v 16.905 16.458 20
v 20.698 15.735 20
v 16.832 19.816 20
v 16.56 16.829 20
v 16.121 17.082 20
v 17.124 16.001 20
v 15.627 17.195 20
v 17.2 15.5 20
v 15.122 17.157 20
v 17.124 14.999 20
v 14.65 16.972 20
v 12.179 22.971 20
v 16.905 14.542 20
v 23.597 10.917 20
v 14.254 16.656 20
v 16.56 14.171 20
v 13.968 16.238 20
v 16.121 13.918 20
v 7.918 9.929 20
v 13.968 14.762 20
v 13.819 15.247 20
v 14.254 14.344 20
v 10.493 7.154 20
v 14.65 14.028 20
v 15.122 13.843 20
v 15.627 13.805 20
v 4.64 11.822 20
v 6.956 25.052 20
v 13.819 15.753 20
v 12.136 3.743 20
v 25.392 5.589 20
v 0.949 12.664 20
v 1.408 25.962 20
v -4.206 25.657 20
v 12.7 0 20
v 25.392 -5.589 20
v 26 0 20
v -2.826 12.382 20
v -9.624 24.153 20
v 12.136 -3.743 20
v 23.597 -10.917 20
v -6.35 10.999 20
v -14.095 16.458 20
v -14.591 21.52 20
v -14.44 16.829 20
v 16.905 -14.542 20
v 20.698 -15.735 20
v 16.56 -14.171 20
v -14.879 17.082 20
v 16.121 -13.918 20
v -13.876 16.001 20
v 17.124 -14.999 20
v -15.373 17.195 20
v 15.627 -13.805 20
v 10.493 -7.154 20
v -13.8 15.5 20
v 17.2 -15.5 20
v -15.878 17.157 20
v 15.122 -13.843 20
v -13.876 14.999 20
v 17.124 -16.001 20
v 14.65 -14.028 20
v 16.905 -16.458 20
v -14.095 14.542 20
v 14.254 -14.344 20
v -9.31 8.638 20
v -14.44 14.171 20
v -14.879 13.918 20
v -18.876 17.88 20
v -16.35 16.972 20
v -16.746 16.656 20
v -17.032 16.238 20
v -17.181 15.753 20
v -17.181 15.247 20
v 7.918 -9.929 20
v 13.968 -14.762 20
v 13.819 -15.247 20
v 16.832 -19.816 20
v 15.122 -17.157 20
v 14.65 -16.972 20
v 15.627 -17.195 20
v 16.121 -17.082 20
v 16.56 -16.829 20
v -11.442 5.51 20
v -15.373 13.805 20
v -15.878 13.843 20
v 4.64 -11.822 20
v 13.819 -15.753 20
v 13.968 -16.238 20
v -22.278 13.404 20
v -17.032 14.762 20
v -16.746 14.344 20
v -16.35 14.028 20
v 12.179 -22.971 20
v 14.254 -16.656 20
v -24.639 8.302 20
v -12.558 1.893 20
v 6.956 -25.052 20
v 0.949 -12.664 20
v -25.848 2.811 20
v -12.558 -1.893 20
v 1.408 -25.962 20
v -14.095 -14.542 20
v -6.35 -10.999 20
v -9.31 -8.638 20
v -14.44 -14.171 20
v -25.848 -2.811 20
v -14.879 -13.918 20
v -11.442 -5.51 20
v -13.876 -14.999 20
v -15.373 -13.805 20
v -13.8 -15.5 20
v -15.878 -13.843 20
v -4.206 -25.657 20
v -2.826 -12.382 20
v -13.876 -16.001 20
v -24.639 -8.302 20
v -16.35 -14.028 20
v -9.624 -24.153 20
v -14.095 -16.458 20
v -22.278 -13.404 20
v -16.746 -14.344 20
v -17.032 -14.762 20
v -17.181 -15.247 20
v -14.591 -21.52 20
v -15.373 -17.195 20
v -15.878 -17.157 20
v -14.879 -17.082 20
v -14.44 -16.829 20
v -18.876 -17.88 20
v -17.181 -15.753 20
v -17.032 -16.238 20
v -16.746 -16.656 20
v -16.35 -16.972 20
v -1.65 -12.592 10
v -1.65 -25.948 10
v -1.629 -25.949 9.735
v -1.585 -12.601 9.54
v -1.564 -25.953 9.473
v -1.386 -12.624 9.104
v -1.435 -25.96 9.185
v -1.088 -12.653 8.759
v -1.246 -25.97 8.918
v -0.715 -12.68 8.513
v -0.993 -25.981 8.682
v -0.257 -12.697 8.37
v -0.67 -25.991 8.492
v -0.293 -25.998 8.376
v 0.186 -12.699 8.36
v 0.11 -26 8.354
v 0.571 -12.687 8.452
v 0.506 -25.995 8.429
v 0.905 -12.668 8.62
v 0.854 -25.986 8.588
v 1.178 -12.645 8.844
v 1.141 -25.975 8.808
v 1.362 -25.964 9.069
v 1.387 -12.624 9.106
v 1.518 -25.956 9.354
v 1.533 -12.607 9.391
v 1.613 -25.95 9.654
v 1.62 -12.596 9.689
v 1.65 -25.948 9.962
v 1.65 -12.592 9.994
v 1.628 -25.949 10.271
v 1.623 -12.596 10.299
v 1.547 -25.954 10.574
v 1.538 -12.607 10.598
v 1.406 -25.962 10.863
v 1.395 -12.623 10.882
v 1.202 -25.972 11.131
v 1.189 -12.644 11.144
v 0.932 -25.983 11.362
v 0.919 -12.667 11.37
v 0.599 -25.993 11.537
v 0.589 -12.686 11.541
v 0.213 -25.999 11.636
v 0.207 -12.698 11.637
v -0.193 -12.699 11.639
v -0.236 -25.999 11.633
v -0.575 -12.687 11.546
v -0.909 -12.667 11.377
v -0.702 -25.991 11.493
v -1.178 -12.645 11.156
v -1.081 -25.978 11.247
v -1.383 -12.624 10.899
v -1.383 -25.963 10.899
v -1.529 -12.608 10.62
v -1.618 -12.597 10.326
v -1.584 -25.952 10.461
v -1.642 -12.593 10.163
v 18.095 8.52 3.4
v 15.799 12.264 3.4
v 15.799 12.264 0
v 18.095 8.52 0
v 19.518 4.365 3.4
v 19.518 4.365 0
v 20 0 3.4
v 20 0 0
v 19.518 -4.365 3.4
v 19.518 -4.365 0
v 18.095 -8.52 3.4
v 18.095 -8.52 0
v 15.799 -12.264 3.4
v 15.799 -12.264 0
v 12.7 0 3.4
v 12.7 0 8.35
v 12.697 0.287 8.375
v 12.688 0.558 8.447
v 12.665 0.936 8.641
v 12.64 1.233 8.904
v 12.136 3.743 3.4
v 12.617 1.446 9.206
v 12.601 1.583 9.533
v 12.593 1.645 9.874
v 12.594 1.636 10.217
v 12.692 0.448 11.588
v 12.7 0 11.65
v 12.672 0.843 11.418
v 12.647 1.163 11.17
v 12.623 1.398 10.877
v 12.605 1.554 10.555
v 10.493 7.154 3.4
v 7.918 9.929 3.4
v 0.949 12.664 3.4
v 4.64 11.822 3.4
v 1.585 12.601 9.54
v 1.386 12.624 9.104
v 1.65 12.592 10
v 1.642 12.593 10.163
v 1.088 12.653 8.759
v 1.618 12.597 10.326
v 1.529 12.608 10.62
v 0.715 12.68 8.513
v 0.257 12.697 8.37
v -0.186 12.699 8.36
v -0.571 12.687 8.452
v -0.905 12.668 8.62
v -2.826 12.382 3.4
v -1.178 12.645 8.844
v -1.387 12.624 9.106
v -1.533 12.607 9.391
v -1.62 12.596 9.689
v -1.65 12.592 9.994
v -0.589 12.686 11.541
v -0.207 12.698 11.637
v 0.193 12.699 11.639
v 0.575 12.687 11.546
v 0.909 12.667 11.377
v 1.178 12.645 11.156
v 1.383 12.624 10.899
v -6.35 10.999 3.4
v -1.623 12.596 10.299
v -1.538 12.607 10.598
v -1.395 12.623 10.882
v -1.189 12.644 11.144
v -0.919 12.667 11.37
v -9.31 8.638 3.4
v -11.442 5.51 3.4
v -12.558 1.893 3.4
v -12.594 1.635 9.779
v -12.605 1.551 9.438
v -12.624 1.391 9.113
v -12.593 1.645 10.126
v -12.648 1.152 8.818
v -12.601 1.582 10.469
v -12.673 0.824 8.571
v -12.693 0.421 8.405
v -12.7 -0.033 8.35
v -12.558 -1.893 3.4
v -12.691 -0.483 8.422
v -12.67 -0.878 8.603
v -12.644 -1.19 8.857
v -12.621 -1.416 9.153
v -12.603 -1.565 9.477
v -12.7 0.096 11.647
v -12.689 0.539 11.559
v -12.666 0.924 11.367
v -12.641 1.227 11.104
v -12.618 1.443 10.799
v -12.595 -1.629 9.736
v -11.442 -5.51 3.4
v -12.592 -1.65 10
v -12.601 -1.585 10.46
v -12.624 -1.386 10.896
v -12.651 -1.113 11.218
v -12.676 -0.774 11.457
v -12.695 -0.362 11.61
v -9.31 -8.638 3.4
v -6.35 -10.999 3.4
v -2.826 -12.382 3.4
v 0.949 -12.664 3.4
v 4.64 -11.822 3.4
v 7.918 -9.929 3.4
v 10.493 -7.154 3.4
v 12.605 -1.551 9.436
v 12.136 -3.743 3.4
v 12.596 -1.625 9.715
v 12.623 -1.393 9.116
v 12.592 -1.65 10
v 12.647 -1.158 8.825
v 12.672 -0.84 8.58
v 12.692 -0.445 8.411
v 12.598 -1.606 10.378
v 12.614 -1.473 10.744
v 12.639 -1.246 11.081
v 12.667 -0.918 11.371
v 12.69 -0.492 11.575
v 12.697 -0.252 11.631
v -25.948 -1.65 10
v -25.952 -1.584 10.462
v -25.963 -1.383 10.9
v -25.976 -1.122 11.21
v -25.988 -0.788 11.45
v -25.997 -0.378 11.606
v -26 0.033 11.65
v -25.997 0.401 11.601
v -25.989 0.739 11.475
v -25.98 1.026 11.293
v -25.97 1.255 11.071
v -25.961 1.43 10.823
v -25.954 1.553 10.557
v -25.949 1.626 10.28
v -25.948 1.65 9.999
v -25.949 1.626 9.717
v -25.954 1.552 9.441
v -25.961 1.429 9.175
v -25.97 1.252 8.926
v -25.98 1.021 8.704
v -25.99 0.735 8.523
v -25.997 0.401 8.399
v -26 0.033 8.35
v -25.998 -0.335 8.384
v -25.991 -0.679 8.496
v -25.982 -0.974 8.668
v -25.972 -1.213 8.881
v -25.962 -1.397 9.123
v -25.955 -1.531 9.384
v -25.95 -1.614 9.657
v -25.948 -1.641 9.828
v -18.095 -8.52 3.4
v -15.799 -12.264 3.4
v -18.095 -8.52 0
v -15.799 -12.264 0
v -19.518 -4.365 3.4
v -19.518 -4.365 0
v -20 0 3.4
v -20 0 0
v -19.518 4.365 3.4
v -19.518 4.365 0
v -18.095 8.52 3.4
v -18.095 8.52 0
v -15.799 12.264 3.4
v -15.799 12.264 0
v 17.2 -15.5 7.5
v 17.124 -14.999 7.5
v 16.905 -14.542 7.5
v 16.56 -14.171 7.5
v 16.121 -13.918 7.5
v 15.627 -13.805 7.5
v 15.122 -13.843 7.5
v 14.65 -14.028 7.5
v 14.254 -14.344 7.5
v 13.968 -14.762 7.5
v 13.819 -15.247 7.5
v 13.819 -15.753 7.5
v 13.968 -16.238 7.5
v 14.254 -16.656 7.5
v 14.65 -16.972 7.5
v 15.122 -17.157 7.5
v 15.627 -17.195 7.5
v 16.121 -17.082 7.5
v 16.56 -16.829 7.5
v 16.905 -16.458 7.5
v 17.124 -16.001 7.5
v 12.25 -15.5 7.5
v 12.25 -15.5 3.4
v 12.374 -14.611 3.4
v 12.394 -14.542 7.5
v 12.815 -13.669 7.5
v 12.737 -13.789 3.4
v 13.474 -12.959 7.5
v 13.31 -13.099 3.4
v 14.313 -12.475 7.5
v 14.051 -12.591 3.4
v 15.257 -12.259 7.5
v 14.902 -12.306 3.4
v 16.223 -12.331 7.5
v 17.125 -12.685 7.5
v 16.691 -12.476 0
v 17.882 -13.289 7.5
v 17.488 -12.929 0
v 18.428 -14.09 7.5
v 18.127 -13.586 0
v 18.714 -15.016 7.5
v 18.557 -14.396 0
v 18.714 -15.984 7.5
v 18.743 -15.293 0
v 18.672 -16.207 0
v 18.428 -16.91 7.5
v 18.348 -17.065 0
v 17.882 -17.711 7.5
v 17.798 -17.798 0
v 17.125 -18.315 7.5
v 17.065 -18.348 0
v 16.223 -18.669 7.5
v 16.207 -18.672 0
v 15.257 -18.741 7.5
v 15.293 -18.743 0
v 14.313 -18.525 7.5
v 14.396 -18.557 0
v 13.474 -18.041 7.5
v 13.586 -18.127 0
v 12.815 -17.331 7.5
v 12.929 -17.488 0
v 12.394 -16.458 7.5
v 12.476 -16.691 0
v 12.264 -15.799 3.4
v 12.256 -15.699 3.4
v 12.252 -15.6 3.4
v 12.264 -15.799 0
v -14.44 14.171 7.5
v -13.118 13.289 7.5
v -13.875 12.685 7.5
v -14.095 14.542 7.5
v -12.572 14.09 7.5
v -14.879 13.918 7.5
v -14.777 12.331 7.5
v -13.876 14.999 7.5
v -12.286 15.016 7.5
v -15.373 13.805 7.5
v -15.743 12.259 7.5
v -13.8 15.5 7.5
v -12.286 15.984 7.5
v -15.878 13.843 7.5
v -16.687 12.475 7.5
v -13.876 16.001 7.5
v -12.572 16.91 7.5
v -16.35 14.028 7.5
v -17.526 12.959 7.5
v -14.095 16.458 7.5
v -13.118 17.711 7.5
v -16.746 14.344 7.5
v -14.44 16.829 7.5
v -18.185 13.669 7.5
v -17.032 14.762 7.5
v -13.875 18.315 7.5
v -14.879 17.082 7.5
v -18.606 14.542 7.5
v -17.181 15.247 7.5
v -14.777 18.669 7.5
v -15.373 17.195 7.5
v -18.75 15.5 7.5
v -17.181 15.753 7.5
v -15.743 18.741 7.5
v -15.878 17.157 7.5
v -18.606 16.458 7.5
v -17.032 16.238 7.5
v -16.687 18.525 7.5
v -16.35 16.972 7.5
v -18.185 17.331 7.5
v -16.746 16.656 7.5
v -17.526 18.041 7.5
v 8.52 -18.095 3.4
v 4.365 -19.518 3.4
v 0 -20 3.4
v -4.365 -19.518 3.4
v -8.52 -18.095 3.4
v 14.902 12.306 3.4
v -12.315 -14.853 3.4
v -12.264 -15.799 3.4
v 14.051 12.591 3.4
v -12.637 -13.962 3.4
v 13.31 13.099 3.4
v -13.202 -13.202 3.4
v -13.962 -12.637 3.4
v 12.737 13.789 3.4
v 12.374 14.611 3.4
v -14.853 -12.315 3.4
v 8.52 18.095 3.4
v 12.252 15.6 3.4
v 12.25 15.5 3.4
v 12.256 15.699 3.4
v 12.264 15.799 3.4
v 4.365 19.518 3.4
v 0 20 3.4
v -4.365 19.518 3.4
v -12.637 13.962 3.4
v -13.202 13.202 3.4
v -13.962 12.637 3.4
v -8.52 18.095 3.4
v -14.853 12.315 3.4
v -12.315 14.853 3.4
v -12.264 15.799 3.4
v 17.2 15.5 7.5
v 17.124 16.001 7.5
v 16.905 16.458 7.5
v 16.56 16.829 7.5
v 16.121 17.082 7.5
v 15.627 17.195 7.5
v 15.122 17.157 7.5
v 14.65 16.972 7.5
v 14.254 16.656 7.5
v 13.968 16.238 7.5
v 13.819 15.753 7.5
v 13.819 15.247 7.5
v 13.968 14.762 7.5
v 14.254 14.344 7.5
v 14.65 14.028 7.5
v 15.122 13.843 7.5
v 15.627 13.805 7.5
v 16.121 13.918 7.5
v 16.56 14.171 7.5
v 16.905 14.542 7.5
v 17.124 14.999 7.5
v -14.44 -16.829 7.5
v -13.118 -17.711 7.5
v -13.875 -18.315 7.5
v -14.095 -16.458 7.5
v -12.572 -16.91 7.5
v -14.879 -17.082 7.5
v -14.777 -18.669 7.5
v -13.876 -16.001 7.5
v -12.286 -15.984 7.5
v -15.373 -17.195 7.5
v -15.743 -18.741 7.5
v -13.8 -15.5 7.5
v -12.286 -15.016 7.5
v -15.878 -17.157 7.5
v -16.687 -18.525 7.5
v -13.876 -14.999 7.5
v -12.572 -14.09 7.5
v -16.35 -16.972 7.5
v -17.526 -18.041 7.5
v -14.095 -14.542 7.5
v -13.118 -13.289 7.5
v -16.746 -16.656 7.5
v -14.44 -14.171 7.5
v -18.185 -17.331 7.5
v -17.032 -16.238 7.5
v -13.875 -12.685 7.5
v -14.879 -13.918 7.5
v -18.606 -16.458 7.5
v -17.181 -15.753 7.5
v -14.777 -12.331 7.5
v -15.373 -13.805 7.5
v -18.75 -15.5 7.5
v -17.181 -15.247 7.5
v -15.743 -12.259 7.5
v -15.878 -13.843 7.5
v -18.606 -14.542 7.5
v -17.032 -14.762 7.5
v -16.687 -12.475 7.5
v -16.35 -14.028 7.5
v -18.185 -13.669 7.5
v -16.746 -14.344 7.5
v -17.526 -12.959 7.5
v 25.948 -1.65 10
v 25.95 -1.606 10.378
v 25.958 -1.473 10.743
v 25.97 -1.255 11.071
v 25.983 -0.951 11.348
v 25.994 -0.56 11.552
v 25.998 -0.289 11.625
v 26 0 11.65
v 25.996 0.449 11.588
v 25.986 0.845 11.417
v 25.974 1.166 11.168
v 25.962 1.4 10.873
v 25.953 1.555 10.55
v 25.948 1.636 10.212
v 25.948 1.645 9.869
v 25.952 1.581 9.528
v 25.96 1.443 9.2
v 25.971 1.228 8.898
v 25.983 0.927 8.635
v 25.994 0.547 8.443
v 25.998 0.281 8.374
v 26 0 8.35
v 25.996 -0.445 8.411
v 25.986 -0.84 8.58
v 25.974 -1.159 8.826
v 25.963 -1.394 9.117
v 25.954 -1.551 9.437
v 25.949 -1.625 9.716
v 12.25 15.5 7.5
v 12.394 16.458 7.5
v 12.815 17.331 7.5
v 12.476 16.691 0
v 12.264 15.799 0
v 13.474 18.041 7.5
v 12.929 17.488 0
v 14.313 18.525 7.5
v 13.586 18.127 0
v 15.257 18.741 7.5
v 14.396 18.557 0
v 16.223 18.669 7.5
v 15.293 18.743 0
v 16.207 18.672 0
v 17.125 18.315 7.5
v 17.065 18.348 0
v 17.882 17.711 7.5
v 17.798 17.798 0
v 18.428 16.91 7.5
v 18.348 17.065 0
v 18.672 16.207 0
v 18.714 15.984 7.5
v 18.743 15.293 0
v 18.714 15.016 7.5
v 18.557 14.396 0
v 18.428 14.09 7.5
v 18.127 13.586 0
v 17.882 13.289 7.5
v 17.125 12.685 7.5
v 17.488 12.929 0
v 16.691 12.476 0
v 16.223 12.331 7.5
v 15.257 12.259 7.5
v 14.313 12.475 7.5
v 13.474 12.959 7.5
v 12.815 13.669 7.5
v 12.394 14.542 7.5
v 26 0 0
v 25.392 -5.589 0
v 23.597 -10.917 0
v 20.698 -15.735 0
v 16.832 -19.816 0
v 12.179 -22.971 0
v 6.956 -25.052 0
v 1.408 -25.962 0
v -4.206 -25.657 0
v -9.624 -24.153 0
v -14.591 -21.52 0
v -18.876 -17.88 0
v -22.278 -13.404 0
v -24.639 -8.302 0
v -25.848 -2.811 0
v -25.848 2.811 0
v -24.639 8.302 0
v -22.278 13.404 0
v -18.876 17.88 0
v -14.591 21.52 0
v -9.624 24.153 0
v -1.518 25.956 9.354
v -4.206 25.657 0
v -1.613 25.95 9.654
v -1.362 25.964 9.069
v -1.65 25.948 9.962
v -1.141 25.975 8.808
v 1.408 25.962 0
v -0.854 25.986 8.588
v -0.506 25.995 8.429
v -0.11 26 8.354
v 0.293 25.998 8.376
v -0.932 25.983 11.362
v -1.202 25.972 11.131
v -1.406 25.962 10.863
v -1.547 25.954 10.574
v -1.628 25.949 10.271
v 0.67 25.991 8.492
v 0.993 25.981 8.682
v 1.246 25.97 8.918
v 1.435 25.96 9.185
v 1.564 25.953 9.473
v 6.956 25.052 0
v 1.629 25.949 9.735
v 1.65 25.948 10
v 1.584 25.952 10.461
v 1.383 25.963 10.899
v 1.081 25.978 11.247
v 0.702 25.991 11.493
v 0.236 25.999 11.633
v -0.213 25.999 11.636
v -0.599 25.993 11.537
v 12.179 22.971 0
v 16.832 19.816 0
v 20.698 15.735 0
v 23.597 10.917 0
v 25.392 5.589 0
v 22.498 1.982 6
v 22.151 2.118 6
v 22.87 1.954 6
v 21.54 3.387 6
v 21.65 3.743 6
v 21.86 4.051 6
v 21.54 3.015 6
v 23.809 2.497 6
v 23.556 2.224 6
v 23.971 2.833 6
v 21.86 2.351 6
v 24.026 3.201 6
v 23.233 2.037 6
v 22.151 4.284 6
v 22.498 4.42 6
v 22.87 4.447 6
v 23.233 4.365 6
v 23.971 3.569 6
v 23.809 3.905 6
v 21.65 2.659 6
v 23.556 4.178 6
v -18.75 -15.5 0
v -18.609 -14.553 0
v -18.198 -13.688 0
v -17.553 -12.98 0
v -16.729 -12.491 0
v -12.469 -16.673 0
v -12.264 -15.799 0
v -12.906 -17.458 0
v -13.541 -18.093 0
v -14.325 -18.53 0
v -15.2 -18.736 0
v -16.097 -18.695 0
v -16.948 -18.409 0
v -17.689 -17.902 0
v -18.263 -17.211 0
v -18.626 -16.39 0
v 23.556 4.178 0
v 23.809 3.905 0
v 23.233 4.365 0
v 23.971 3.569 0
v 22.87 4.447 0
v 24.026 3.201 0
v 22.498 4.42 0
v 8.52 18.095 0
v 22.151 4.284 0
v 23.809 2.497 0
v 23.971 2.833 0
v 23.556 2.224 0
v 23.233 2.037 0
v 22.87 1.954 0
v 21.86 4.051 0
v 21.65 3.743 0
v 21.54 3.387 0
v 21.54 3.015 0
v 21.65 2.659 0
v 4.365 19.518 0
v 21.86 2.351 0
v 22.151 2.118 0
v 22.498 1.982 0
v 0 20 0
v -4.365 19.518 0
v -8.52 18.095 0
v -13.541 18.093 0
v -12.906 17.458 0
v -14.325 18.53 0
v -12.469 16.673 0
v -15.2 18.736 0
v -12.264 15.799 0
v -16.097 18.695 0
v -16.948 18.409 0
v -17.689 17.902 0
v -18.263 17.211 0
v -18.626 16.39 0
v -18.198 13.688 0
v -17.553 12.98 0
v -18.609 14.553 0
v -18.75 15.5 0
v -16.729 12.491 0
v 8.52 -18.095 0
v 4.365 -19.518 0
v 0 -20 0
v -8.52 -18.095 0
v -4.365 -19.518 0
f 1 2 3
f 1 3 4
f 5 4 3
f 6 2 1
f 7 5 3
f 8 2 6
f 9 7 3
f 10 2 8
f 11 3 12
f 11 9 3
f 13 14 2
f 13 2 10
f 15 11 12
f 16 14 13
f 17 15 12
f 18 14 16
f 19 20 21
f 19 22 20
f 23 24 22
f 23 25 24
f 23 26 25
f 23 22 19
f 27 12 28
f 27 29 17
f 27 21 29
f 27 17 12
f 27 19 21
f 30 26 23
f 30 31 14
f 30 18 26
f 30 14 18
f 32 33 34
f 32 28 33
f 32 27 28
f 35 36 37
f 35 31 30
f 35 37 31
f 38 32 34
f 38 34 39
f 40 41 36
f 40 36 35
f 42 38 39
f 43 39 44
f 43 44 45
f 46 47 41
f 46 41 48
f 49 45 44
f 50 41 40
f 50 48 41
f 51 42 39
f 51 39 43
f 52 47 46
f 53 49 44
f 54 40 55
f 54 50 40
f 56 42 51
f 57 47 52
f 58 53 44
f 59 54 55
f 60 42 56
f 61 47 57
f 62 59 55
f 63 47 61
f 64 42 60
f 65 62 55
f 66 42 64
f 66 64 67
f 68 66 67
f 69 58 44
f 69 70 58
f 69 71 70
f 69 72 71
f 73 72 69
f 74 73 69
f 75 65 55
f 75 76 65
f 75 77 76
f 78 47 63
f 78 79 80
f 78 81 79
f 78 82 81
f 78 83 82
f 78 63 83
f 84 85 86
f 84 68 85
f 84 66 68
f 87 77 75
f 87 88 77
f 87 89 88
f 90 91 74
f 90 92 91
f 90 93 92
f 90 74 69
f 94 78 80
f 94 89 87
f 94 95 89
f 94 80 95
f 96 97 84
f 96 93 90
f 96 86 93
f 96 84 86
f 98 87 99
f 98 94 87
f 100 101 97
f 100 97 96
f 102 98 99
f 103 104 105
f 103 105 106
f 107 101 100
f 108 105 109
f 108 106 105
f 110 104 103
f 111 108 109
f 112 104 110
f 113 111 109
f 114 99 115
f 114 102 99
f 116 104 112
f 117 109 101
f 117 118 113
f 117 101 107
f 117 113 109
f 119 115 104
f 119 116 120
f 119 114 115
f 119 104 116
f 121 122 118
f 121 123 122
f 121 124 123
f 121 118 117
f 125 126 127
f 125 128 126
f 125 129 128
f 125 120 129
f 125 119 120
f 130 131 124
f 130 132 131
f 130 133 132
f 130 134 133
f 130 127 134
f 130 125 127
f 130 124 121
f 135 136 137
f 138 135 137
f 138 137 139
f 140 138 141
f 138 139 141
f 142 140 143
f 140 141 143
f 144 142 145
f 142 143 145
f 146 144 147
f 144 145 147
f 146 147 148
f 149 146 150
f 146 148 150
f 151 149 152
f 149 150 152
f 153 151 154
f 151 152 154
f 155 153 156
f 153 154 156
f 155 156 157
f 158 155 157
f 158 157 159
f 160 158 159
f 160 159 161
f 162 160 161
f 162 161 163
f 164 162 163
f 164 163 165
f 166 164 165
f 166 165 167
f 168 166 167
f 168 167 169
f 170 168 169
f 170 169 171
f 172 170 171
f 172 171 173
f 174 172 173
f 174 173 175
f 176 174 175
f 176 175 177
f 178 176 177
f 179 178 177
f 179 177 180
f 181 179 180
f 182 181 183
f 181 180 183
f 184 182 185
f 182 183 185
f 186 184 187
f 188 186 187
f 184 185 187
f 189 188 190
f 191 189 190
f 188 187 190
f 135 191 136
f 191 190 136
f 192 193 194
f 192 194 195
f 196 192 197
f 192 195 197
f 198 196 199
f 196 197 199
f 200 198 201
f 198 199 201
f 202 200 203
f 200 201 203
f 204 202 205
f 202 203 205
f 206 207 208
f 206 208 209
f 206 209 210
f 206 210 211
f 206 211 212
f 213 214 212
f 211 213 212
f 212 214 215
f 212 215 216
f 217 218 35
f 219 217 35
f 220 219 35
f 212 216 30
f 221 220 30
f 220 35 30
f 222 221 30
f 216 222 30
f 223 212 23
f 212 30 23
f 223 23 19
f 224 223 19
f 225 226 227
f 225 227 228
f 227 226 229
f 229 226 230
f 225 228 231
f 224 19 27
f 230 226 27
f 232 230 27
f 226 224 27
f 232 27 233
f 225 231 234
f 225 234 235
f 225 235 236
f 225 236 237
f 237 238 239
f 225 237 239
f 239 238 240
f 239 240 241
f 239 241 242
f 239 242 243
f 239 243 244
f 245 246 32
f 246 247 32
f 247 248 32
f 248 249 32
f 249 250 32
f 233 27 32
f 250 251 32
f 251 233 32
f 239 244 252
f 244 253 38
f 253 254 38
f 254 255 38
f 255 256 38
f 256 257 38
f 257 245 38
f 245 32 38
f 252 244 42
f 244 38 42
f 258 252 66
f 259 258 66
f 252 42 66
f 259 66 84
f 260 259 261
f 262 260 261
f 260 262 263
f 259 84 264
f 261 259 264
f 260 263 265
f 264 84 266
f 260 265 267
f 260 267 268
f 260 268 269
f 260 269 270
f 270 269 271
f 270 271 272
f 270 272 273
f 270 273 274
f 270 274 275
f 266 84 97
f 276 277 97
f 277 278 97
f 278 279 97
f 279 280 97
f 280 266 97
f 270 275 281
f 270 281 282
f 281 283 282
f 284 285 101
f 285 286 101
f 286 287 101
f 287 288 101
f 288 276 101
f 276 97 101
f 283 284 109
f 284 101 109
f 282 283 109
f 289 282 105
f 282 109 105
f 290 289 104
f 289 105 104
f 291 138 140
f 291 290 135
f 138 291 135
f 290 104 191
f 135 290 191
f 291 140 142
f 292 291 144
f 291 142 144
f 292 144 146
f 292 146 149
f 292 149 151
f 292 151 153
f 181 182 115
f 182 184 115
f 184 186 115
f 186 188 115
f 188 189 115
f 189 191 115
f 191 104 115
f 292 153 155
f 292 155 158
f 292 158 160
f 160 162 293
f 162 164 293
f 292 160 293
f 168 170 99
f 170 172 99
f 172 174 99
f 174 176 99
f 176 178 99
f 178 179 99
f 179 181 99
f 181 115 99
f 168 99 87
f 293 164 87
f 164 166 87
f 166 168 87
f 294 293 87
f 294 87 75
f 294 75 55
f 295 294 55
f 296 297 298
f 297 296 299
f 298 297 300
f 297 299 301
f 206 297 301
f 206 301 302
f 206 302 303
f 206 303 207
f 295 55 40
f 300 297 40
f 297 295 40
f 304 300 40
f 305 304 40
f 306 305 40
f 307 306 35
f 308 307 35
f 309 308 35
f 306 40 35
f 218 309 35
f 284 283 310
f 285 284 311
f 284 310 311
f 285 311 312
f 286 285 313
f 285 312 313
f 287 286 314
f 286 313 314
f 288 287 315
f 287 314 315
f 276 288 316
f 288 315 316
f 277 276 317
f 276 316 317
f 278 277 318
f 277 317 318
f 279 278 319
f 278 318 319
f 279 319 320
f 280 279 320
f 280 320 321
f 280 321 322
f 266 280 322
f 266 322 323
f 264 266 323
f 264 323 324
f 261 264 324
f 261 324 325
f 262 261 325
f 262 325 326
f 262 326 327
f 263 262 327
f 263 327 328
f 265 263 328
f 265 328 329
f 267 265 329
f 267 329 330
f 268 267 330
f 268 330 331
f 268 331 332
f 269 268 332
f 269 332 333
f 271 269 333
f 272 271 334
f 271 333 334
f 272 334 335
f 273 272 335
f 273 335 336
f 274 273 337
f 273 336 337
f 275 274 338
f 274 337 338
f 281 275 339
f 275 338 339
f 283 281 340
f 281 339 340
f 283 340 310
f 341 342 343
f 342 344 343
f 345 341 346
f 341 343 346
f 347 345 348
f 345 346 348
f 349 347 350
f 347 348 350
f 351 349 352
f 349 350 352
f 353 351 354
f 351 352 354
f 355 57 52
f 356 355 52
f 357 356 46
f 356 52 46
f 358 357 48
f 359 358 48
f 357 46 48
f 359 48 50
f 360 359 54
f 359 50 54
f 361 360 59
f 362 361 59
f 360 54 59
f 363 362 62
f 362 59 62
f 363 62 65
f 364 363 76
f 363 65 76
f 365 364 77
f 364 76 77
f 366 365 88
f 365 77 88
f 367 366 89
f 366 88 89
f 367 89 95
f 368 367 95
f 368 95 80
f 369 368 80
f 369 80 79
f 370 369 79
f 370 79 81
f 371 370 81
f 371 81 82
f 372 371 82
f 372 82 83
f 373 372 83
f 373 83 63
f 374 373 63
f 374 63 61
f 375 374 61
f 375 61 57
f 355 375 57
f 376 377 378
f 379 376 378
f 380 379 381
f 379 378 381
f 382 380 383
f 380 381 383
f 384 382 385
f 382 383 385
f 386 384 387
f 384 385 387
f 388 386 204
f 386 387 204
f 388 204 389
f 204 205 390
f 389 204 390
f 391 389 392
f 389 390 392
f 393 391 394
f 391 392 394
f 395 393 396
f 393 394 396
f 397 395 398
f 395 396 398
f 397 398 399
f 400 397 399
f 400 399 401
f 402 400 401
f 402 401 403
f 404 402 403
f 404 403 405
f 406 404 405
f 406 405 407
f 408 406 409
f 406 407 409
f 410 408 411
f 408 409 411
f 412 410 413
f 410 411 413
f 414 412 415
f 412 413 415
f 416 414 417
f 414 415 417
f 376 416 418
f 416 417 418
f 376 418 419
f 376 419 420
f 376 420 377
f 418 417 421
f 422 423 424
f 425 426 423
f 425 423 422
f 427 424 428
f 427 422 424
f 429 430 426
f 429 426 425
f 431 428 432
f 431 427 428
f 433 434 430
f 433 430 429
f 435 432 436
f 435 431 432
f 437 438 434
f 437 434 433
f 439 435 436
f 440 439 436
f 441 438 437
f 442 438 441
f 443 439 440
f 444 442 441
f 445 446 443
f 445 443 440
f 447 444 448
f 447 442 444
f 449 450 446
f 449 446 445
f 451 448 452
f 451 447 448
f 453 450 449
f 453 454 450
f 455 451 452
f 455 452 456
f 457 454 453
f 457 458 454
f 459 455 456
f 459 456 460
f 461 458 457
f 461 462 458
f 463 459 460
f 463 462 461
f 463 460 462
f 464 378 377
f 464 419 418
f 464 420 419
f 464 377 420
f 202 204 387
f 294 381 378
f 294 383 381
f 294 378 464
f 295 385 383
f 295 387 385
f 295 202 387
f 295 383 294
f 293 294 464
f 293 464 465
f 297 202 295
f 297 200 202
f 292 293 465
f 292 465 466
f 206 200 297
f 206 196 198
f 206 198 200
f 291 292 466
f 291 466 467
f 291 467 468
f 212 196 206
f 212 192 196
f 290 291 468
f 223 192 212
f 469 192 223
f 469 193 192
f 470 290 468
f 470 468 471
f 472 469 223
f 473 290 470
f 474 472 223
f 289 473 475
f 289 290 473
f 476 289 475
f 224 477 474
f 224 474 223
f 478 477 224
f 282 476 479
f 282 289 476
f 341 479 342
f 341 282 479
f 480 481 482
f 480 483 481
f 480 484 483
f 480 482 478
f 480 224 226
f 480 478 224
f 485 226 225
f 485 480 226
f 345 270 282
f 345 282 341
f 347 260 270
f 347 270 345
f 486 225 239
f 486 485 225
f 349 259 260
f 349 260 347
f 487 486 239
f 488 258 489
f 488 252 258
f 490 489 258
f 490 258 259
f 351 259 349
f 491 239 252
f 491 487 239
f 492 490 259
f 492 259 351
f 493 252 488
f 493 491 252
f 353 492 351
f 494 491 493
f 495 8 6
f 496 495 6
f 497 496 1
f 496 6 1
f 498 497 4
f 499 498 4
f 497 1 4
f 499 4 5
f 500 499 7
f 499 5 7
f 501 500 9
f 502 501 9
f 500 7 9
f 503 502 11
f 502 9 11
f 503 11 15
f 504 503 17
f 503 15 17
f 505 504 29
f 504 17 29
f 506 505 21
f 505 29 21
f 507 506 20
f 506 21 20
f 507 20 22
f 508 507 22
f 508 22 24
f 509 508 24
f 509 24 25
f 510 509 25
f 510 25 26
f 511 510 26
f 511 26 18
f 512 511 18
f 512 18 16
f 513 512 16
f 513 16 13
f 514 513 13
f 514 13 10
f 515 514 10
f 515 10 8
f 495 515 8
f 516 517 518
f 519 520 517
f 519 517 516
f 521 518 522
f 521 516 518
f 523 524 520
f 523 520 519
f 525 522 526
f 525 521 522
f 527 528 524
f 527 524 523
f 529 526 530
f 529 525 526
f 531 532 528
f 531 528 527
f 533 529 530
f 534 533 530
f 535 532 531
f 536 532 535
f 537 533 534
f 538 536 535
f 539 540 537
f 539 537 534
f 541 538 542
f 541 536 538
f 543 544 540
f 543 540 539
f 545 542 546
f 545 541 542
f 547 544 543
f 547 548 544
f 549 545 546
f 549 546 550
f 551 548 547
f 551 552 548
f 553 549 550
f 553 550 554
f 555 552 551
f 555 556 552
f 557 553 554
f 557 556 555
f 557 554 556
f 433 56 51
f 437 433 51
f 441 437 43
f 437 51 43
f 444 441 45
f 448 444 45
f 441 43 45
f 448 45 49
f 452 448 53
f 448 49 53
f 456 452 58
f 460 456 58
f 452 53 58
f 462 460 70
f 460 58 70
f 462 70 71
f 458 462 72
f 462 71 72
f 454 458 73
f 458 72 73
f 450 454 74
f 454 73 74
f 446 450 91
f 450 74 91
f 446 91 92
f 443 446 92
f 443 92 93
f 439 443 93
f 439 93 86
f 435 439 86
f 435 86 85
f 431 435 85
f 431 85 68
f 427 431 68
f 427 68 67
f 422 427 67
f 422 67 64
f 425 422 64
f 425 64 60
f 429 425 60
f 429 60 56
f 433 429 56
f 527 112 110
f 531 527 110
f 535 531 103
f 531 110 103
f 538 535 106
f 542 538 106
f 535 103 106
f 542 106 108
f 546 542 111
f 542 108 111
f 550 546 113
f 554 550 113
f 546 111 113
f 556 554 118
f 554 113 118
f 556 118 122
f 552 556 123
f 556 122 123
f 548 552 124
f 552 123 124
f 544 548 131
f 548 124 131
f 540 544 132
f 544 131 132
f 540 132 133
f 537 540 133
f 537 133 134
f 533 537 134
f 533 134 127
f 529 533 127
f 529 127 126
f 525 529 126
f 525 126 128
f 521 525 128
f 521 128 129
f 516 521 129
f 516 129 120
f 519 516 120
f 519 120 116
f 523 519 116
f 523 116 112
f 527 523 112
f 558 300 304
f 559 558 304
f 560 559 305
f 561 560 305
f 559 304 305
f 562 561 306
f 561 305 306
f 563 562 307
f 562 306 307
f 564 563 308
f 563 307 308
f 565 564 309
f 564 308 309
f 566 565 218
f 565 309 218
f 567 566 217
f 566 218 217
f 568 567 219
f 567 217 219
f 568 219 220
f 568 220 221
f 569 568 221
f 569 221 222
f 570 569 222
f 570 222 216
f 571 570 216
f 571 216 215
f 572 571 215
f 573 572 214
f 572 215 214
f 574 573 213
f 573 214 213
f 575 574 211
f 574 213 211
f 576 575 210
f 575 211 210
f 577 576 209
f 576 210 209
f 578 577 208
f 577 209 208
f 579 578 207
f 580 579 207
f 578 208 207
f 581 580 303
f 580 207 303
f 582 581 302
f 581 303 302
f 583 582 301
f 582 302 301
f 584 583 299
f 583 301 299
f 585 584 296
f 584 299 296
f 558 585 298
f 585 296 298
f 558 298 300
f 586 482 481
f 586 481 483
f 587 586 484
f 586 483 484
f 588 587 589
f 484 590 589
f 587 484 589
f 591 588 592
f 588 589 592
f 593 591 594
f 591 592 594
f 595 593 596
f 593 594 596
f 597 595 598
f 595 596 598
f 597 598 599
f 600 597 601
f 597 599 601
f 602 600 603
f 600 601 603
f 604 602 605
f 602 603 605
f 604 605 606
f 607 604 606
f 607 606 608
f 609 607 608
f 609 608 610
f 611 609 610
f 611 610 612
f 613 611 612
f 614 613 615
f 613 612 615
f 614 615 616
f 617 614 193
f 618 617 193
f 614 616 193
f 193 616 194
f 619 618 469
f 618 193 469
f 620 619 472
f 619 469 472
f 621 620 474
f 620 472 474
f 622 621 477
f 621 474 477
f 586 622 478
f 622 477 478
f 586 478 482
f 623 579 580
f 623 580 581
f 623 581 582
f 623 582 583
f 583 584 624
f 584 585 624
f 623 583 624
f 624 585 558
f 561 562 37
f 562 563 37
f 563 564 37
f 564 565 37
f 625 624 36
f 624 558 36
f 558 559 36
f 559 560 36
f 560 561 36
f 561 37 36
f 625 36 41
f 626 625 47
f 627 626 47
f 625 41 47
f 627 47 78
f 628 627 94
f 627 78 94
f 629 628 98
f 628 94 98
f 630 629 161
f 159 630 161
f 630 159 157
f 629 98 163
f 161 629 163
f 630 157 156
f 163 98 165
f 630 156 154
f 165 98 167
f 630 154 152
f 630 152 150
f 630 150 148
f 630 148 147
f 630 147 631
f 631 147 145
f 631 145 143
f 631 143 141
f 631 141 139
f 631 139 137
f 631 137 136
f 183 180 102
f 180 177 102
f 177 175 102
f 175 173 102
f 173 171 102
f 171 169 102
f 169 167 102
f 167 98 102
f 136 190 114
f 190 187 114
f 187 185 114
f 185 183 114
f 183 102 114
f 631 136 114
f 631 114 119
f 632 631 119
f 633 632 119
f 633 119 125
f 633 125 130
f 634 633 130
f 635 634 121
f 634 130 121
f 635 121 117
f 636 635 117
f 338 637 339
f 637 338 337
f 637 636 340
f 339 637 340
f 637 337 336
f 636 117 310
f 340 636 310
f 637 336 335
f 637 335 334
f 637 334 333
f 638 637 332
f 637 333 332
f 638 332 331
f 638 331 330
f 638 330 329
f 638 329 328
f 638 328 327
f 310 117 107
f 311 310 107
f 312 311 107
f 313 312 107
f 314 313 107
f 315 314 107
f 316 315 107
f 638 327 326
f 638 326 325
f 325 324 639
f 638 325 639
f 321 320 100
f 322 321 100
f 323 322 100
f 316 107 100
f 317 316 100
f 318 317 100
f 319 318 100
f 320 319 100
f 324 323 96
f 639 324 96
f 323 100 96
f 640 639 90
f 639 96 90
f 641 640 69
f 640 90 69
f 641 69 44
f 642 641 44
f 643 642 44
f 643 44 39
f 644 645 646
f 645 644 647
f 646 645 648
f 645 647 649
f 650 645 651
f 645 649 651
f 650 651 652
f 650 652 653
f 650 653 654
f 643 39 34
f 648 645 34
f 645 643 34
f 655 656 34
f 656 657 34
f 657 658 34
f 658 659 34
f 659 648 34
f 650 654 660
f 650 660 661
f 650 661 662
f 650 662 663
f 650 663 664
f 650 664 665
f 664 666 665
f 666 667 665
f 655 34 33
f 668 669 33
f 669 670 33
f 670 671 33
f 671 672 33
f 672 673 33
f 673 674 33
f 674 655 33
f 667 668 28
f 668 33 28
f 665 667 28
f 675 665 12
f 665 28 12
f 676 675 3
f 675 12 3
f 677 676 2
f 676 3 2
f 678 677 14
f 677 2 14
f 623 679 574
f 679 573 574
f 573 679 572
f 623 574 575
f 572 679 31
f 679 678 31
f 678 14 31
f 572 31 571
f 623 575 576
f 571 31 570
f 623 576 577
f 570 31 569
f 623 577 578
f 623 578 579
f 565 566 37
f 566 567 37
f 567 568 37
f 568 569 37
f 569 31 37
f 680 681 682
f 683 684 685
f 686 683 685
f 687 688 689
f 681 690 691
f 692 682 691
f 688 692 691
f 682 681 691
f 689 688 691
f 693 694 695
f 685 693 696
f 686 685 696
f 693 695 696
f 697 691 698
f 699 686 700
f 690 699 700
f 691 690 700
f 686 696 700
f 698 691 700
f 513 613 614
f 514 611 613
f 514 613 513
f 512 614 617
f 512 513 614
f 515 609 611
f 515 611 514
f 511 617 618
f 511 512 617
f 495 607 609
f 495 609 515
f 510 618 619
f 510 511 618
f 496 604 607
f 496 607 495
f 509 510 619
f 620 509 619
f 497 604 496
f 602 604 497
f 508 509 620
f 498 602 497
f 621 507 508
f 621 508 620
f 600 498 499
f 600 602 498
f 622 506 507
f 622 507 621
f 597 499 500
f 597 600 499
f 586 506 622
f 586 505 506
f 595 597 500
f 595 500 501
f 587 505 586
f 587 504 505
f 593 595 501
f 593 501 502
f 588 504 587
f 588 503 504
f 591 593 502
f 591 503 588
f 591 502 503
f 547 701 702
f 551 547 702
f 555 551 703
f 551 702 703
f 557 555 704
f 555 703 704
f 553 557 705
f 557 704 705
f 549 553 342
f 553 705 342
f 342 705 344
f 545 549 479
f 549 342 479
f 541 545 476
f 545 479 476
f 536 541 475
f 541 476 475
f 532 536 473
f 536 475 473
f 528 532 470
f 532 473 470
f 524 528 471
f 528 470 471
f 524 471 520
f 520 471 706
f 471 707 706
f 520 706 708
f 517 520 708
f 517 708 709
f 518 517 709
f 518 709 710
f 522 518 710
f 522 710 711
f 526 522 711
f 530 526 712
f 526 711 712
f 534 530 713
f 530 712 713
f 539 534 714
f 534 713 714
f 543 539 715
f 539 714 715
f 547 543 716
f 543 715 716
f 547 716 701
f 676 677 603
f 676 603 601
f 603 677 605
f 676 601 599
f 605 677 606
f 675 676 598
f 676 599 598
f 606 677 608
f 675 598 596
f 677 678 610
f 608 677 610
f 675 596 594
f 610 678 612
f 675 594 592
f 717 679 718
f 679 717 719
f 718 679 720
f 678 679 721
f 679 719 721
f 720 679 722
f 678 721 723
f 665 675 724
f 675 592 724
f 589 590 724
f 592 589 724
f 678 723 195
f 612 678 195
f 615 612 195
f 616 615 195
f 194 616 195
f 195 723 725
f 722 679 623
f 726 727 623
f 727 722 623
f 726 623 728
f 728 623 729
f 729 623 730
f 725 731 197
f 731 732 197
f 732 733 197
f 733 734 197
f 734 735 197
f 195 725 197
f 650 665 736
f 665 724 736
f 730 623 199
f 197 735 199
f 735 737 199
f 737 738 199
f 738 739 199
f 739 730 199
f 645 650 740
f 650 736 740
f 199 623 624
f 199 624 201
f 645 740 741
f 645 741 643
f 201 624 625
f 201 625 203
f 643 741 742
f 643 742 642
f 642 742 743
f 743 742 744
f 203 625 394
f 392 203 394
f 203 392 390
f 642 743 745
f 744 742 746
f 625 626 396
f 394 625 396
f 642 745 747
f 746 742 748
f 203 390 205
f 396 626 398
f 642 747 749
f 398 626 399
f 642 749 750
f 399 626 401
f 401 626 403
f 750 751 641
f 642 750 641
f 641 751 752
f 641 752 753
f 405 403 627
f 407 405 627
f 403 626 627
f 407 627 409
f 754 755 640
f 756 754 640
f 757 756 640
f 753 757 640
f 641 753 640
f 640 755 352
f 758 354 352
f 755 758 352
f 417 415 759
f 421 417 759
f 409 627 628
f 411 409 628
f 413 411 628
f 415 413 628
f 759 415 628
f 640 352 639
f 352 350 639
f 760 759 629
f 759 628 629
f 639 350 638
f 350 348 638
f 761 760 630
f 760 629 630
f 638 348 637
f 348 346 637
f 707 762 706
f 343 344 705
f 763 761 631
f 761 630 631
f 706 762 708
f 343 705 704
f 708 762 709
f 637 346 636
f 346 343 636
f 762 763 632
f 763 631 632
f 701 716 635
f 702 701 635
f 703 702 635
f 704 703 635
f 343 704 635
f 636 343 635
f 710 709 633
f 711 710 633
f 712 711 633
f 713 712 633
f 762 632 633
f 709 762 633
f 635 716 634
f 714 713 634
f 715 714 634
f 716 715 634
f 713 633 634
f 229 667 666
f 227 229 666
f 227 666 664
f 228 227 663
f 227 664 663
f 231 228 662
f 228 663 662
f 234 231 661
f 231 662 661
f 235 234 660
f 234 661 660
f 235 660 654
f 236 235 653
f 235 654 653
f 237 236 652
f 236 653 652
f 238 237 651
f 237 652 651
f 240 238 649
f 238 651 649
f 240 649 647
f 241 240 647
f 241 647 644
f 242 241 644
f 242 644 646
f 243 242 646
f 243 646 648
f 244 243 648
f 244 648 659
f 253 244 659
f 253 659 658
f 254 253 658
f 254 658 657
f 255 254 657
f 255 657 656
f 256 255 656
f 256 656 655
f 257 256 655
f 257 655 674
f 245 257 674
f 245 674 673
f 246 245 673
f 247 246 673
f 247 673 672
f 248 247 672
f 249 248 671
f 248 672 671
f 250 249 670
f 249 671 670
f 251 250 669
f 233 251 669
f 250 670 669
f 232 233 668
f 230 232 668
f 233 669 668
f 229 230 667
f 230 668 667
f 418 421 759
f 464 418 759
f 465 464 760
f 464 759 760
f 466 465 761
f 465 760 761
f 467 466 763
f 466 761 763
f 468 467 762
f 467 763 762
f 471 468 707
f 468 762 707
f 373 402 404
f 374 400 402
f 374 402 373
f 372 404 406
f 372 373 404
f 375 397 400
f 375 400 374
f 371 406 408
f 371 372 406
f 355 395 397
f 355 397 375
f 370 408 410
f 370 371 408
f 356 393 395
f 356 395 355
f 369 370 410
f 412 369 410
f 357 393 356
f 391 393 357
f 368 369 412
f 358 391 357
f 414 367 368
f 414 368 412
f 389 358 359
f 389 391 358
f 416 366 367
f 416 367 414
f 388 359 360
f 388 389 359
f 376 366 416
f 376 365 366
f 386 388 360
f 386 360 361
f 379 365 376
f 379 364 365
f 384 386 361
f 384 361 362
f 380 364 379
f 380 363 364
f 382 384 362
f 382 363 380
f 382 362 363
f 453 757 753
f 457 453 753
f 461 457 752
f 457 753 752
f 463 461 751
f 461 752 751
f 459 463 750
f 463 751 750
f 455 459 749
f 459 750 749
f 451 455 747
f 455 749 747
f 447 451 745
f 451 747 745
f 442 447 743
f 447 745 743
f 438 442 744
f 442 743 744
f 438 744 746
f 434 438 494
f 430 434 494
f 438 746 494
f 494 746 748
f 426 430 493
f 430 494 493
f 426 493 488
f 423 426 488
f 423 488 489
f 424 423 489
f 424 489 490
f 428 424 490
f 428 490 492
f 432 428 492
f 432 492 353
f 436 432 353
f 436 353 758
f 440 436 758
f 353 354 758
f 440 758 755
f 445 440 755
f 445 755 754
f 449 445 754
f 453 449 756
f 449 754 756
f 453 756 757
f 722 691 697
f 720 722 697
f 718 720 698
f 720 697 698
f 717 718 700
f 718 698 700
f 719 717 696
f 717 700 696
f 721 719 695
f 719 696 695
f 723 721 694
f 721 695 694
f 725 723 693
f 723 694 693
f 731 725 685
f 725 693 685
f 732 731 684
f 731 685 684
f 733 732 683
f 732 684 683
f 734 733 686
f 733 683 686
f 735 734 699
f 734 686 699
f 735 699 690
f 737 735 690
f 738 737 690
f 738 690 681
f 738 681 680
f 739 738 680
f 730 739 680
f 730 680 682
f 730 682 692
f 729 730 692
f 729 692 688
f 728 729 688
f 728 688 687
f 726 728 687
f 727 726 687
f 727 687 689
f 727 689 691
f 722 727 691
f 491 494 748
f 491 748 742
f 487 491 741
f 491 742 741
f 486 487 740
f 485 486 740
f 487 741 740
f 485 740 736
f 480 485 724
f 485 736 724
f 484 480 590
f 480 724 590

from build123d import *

# Parameters (mm, degrees)
SKETCH1_W                                           = 26
SKETCH1_H                                           = 20
F_2_CLEARANCE_HOLE1_D                               = 2.5
F_2_CLEARANCE_HOLE1_DEPTH                           = 6
HOLE1_D                                             = 25.4
HOLE1_DEPTH                                         = 20
HOLE1_CBORE_D                                       = 40
HOLE1_CBORE_DEPTH                                   = 3.4
F_4_CLEARANCE_HOLE1_D                               = 3.3
F_4_CLEARANCE_HOLE1_DEPTH                           = 65.407641206
F_4_CLEARANCE_HOLE2_D                               = 3.3
F_4_CLEARANCE_HOLE2_DEPTH                           = 13.407641206
F_4_CLEARANCE_HOLE3_D                               = 3.3
F_4_CLEARANCE_HOLE3_DEPTH                           = 13.407641206
CBORE_FOR_4_BINDING_HEAD_MACHINE_SCREW1_D           = 3.4
CBORE_FOR_4_BINDING_HEAD_MACHINE_SCREW1_DEPTH       = 20
CBORE_FOR_4_BINDING_HEAD_MACHINE_SCREW1_CBORE_D     = 6.5
CBORE_FOR_4_BINDING_HEAD_MACHINE_SCREW1_CBORE_DEPTH = 7.5


with BuildPart() as part:
    # Sketch1 → Revolve1 (revolve)
    with BuildSketch(Plane.XZ):
        with Locations((13, 10)):
            Rectangle(SKETCH1_W, SKETCH1_H)
    revolve(axis=Axis((0, 0, 20), (0, 0, -1)))

    # #2 Clearance Hole1
    with Locations(Plane(origin=(0, 0, 0), x_dir=(-1, 0, 0), z_dir=(0, 0, -1))):
        with Locations((-22.776165581, 3.200981322)):
            Hole(F_2_CLEARANCE_HOLE1_D / 2, depth=F_2_CLEARANCE_HOLE1_DEPTH)

    # Hole1
    with Locations(Plane(origin=(0, 0, 0), x_dir=(-1, 0, 0), z_dir=(0, 0, -1))):
        with Locations((0, 0)):
            CounterBoreHole(HOLE1_D / 2, HOLE1_CBORE_D / 2, HOLE1_CBORE_DEPTH, depth=HOLE1_DEPTH)

    # #4 Clearance Hole1
    with Locations(Plane(origin=(26, 0, 10), x_dir=(0, 1, 0), z_dir=(1, 0, 0))):
        with Locations((0, 0)):
            Hole(F_4_CLEARANCE_HOLE1_D / 2, depth=F_4_CLEARANCE_HOLE1_DEPTH)

    # #4 Clearance Hole2
    with Locations(Plane(origin=(0, 12.592358794, 0), x_dir=(-1, 0, 0), z_dir=(0, -1, 0))):
        with Locations((0, -10)):
            Hole(F_4_CLEARANCE_HOLE2_D / 2, depth=F_4_CLEARANCE_HOLE2_DEPTH)

    # #4 Clearance Hole3
    with Locations(Plane(origin=(0, -12.592358794, 0), x_dir=(1, 0, 0), z_dir=(0, 1, 0))):
        with Locations((0, -10)):
            Hole(F_4_CLEARANCE_HOLE3_D / 2, depth=F_4_CLEARANCE_HOLE3_DEPTH)

    # CBORE for #4 Binding Head Machine Screw1
    with Locations(Plane(origin=(0, 0, 0), x_dir=(-1, 0, 0), z_dir=(0, 0, -1))):
        with Locations((-15.5, -15.5), (15.5, -15.5), (15.5, 15.5), (-15.5, 15.5)):
            CounterBoreHole(CBORE_FOR_4_BINDING_HEAD_MACHINE_SCREW1_D / 2, CBORE_FOR_4_BINDING_HEAD_MACHINE_SCREW1_CBORE_D / 2, CBORE_FOR_4_BINDING_HEAD_MACHINE_SCREW1_CBORE_DEPTH, depth=CBORE_FOR_4_BINDING_HEAD_MACHINE_SCREW1_DEPTH)


solid = part.part
